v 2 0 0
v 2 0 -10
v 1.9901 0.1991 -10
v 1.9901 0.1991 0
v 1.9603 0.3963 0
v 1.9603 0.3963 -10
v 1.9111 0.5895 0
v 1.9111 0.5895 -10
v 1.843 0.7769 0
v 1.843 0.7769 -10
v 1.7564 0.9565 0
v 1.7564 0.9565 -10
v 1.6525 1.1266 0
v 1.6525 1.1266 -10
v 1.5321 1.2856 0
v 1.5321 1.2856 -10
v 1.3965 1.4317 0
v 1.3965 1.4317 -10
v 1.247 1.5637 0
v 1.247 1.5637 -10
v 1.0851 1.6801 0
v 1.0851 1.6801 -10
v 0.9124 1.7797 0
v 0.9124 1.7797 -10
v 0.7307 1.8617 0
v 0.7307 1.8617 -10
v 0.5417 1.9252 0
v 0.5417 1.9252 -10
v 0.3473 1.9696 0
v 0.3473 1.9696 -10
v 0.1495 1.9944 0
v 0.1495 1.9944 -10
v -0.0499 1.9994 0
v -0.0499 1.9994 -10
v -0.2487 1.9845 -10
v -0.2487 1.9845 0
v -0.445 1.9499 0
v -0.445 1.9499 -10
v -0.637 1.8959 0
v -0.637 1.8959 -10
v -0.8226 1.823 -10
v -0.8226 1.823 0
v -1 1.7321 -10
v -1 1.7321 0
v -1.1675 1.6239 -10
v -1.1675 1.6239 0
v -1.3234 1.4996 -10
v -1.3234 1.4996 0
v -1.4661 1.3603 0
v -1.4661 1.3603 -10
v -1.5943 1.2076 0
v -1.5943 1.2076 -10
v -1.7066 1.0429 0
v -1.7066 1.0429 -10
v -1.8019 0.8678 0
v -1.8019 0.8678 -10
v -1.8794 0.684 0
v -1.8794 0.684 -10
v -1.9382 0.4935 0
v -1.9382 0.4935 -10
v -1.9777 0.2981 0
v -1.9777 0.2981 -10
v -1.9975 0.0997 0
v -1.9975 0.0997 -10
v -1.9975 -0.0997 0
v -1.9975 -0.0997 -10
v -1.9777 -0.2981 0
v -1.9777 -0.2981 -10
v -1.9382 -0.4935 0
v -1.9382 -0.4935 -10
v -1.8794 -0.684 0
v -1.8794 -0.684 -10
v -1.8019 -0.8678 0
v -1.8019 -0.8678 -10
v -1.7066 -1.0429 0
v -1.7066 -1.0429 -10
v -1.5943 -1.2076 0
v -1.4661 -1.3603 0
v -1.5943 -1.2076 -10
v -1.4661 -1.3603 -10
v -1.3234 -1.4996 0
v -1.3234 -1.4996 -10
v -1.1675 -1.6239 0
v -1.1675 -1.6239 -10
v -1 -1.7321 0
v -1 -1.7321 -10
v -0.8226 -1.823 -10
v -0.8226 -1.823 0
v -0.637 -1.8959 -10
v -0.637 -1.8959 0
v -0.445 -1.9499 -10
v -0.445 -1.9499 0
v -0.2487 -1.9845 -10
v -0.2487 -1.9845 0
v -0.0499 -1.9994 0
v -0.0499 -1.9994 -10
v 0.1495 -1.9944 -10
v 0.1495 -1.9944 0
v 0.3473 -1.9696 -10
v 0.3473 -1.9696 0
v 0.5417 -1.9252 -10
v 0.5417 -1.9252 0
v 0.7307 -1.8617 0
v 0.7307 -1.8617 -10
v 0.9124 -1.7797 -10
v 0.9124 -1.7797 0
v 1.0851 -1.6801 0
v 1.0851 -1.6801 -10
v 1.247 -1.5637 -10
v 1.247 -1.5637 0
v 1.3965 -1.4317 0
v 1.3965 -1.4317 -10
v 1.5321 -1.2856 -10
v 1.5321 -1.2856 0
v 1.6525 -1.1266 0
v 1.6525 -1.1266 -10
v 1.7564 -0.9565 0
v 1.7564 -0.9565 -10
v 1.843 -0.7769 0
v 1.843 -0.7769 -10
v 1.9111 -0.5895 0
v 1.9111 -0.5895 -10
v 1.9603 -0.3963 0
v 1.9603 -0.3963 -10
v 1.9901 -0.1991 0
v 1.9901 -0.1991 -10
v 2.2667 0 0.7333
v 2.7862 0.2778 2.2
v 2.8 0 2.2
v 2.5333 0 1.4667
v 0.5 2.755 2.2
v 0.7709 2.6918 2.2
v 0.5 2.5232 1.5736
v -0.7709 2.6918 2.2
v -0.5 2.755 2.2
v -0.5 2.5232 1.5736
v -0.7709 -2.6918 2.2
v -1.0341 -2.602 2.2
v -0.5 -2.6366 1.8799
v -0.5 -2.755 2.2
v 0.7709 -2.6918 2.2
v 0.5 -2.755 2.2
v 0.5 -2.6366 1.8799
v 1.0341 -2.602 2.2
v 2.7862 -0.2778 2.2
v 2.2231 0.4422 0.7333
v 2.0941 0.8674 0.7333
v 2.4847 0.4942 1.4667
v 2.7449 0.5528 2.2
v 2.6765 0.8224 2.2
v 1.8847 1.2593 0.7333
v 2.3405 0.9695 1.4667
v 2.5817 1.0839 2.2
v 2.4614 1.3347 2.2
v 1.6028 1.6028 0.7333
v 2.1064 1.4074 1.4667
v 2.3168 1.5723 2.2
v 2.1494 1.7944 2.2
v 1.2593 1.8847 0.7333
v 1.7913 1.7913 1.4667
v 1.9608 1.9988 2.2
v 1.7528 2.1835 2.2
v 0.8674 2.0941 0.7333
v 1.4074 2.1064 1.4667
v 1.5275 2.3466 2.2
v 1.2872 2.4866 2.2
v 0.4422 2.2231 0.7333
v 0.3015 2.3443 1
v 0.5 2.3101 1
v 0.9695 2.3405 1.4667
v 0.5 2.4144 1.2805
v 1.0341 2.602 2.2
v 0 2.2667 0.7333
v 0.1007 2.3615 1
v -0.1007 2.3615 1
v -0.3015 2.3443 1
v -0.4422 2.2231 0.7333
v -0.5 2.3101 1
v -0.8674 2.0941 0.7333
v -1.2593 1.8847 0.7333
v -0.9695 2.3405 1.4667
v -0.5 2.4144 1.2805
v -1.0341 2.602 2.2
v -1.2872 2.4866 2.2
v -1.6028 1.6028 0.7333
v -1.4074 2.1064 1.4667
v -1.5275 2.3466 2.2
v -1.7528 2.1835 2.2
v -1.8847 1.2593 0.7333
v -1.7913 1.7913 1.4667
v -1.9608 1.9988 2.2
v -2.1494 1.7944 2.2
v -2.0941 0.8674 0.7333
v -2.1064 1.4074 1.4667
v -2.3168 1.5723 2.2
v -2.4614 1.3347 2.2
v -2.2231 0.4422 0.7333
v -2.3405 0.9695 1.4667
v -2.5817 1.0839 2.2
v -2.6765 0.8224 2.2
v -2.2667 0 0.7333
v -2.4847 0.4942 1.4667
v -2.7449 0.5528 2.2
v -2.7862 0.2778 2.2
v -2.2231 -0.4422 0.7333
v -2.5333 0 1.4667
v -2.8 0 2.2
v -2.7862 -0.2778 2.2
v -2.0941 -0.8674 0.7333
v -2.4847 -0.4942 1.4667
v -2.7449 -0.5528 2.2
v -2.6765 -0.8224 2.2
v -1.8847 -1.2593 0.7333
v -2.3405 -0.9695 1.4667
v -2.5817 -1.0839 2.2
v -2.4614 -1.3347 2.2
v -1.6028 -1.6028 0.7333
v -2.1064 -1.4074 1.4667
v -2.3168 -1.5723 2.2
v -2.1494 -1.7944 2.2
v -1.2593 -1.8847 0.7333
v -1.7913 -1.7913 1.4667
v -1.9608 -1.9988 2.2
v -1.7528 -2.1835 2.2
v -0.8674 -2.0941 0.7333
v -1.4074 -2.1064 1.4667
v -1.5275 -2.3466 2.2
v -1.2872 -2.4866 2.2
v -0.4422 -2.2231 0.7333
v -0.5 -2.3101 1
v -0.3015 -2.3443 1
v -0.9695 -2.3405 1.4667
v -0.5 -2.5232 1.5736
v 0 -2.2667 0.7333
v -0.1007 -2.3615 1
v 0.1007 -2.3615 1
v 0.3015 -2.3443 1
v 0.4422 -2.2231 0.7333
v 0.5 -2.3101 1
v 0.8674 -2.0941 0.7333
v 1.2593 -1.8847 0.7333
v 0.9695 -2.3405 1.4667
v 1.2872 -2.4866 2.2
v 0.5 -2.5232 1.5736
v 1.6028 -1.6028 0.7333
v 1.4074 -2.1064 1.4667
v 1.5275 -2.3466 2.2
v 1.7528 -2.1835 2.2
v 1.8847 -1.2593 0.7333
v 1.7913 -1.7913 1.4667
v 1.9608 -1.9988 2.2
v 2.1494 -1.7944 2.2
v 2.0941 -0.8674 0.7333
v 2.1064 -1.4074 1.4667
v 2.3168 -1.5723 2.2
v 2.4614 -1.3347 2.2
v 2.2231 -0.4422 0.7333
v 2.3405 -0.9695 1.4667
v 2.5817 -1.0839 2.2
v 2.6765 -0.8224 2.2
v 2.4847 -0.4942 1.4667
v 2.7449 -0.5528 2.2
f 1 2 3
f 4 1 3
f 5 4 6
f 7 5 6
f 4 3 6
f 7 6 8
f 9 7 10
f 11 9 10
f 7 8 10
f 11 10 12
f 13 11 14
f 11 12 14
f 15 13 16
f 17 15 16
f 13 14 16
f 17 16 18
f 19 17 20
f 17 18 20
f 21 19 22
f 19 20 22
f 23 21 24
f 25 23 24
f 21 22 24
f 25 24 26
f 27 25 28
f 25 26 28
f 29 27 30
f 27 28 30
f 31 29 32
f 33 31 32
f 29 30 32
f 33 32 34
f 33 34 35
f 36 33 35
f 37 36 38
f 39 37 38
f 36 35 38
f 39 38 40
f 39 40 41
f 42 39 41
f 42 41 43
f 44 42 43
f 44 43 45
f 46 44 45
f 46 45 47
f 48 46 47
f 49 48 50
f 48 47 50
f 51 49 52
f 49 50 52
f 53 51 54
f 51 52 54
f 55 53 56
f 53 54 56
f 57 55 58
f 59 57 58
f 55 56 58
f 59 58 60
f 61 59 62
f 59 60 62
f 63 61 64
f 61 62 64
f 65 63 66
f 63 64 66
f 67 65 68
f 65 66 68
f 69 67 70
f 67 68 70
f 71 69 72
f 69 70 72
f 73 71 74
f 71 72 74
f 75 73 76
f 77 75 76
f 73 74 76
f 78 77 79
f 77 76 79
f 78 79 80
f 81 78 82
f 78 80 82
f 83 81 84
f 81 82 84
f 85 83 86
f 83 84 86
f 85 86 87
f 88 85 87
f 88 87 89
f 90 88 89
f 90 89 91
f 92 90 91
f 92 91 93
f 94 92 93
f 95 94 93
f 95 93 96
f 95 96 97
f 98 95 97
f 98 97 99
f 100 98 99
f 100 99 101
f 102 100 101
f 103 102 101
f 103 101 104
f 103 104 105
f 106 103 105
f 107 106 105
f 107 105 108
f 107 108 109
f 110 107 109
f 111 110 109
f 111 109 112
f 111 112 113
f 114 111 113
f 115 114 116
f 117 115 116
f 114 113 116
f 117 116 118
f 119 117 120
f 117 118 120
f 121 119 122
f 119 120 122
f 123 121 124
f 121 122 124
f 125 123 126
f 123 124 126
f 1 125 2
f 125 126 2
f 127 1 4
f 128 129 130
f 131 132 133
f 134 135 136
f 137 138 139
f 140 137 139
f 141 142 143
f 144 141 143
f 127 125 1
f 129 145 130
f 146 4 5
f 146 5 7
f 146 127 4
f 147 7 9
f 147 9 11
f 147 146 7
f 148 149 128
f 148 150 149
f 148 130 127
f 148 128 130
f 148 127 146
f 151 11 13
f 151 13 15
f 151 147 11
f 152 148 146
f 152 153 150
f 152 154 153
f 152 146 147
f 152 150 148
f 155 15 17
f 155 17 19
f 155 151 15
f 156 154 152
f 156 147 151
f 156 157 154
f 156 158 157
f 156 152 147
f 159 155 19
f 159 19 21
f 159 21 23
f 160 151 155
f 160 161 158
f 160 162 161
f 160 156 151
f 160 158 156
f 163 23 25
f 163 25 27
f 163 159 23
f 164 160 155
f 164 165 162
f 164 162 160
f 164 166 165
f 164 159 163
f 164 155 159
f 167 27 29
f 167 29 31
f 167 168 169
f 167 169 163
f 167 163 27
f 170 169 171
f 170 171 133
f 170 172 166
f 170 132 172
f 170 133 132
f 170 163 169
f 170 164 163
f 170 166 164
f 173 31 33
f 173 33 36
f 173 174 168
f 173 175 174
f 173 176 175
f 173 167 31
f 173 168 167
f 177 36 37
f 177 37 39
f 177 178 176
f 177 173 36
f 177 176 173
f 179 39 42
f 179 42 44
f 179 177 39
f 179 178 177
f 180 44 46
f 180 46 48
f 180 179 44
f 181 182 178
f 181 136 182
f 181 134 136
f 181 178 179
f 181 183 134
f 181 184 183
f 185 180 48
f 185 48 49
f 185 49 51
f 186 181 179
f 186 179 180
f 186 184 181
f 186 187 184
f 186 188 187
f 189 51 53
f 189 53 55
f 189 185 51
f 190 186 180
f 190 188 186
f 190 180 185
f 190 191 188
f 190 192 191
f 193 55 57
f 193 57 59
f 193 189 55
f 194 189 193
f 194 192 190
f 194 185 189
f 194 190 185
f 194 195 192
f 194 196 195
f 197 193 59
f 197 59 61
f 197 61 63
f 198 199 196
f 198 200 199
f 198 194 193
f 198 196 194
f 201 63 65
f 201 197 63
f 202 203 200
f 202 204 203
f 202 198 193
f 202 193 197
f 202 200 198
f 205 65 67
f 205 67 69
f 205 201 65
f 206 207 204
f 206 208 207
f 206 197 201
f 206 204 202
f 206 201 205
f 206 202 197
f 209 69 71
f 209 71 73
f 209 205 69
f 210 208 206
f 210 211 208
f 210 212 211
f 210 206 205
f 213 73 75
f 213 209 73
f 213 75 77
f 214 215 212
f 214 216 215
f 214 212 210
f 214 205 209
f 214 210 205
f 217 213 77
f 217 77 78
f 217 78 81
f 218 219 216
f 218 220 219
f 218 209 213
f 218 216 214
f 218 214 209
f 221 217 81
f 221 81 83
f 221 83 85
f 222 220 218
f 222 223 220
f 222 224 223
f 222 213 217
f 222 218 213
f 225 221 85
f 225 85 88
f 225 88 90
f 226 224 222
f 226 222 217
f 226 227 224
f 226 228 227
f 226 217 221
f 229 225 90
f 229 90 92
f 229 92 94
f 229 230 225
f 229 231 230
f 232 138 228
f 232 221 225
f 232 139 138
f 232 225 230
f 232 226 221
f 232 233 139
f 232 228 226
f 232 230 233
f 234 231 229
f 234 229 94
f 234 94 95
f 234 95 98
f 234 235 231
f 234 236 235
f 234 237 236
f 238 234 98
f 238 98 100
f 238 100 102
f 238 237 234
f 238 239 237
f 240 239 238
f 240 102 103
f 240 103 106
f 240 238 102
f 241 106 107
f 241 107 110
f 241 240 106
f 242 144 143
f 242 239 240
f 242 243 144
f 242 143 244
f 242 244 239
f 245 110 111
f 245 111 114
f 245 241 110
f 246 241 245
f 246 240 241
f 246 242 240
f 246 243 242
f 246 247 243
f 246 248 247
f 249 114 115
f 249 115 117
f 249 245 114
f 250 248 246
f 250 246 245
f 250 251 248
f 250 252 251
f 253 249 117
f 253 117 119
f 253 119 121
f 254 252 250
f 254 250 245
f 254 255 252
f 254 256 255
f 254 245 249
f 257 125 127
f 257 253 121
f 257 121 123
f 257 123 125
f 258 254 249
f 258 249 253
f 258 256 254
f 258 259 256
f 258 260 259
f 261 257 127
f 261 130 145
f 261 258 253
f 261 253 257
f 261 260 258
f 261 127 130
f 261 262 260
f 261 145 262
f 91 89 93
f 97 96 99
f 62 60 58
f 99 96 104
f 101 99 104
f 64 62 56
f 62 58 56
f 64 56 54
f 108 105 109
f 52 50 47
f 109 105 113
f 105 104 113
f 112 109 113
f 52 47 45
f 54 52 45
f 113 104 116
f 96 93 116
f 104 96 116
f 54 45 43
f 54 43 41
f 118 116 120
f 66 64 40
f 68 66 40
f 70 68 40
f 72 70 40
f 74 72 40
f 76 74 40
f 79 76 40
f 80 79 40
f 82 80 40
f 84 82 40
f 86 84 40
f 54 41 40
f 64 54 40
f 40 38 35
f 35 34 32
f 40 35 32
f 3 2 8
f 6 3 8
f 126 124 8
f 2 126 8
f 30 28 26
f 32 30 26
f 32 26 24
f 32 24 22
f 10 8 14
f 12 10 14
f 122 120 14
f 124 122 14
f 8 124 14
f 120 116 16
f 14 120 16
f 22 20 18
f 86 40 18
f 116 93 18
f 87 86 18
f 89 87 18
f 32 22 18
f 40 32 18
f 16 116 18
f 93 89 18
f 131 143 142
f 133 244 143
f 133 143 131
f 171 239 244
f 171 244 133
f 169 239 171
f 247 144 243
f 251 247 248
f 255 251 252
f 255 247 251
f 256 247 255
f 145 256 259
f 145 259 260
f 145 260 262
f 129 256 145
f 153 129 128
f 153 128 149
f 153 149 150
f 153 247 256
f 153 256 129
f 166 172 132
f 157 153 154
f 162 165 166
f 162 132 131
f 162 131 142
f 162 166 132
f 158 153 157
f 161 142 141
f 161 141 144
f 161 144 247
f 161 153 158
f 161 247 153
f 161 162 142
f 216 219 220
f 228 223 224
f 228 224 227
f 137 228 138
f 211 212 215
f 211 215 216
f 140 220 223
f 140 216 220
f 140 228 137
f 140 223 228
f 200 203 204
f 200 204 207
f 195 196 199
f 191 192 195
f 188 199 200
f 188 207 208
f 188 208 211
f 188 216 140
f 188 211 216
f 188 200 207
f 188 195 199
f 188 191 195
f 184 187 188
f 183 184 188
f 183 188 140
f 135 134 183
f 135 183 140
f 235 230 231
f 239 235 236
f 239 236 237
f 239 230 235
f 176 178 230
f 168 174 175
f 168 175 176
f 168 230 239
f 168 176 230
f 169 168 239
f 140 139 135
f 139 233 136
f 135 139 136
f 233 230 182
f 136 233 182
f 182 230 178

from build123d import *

# Parameters (mm, degrees)
BOX_W          = 1
BOX_H          = 10
BOX_DEPTH      = 2
CYLINDER_R     = 2
CYLINDER_DEPTH = 10


with BuildPart() as cub:
    # Box → Box (new body)
    with BuildSketch(Plane(origin=(-0.5, -5, 1), x_dir=(1, 0, 0), z_dir=(0, 0, 1))):
        with Locations((0.5, 5)):
            Rectangle(BOX_W, BOX_H)
    extrude(amount=BOX_DEPTH)


with BuildPart() as cilindre:
    # Cylinder → Cylinder (new body)
    with BuildSketch(Plane.XY.offset(-10)):
        Circle(CYLINDER_R)
    extrude(amount=CYLINDER_DEPTH)


with BuildPart() as cut:
    # Cone → Cone (revolve)
    with BuildSketch(Plane.XZ):
        Polygon((0, 0), (2, 0), (2.8, 2.2), (0, 2.2), align=None)
    revolve(axis=Axis((0, 0, 0), (0, 0, 1)))

    # Fusion: union Cilindre
    add(cilindre.part)

    # Cut: cut Cub
    add(cub.part, mode=Mode.SUBTRACT)


solid = cut.part
